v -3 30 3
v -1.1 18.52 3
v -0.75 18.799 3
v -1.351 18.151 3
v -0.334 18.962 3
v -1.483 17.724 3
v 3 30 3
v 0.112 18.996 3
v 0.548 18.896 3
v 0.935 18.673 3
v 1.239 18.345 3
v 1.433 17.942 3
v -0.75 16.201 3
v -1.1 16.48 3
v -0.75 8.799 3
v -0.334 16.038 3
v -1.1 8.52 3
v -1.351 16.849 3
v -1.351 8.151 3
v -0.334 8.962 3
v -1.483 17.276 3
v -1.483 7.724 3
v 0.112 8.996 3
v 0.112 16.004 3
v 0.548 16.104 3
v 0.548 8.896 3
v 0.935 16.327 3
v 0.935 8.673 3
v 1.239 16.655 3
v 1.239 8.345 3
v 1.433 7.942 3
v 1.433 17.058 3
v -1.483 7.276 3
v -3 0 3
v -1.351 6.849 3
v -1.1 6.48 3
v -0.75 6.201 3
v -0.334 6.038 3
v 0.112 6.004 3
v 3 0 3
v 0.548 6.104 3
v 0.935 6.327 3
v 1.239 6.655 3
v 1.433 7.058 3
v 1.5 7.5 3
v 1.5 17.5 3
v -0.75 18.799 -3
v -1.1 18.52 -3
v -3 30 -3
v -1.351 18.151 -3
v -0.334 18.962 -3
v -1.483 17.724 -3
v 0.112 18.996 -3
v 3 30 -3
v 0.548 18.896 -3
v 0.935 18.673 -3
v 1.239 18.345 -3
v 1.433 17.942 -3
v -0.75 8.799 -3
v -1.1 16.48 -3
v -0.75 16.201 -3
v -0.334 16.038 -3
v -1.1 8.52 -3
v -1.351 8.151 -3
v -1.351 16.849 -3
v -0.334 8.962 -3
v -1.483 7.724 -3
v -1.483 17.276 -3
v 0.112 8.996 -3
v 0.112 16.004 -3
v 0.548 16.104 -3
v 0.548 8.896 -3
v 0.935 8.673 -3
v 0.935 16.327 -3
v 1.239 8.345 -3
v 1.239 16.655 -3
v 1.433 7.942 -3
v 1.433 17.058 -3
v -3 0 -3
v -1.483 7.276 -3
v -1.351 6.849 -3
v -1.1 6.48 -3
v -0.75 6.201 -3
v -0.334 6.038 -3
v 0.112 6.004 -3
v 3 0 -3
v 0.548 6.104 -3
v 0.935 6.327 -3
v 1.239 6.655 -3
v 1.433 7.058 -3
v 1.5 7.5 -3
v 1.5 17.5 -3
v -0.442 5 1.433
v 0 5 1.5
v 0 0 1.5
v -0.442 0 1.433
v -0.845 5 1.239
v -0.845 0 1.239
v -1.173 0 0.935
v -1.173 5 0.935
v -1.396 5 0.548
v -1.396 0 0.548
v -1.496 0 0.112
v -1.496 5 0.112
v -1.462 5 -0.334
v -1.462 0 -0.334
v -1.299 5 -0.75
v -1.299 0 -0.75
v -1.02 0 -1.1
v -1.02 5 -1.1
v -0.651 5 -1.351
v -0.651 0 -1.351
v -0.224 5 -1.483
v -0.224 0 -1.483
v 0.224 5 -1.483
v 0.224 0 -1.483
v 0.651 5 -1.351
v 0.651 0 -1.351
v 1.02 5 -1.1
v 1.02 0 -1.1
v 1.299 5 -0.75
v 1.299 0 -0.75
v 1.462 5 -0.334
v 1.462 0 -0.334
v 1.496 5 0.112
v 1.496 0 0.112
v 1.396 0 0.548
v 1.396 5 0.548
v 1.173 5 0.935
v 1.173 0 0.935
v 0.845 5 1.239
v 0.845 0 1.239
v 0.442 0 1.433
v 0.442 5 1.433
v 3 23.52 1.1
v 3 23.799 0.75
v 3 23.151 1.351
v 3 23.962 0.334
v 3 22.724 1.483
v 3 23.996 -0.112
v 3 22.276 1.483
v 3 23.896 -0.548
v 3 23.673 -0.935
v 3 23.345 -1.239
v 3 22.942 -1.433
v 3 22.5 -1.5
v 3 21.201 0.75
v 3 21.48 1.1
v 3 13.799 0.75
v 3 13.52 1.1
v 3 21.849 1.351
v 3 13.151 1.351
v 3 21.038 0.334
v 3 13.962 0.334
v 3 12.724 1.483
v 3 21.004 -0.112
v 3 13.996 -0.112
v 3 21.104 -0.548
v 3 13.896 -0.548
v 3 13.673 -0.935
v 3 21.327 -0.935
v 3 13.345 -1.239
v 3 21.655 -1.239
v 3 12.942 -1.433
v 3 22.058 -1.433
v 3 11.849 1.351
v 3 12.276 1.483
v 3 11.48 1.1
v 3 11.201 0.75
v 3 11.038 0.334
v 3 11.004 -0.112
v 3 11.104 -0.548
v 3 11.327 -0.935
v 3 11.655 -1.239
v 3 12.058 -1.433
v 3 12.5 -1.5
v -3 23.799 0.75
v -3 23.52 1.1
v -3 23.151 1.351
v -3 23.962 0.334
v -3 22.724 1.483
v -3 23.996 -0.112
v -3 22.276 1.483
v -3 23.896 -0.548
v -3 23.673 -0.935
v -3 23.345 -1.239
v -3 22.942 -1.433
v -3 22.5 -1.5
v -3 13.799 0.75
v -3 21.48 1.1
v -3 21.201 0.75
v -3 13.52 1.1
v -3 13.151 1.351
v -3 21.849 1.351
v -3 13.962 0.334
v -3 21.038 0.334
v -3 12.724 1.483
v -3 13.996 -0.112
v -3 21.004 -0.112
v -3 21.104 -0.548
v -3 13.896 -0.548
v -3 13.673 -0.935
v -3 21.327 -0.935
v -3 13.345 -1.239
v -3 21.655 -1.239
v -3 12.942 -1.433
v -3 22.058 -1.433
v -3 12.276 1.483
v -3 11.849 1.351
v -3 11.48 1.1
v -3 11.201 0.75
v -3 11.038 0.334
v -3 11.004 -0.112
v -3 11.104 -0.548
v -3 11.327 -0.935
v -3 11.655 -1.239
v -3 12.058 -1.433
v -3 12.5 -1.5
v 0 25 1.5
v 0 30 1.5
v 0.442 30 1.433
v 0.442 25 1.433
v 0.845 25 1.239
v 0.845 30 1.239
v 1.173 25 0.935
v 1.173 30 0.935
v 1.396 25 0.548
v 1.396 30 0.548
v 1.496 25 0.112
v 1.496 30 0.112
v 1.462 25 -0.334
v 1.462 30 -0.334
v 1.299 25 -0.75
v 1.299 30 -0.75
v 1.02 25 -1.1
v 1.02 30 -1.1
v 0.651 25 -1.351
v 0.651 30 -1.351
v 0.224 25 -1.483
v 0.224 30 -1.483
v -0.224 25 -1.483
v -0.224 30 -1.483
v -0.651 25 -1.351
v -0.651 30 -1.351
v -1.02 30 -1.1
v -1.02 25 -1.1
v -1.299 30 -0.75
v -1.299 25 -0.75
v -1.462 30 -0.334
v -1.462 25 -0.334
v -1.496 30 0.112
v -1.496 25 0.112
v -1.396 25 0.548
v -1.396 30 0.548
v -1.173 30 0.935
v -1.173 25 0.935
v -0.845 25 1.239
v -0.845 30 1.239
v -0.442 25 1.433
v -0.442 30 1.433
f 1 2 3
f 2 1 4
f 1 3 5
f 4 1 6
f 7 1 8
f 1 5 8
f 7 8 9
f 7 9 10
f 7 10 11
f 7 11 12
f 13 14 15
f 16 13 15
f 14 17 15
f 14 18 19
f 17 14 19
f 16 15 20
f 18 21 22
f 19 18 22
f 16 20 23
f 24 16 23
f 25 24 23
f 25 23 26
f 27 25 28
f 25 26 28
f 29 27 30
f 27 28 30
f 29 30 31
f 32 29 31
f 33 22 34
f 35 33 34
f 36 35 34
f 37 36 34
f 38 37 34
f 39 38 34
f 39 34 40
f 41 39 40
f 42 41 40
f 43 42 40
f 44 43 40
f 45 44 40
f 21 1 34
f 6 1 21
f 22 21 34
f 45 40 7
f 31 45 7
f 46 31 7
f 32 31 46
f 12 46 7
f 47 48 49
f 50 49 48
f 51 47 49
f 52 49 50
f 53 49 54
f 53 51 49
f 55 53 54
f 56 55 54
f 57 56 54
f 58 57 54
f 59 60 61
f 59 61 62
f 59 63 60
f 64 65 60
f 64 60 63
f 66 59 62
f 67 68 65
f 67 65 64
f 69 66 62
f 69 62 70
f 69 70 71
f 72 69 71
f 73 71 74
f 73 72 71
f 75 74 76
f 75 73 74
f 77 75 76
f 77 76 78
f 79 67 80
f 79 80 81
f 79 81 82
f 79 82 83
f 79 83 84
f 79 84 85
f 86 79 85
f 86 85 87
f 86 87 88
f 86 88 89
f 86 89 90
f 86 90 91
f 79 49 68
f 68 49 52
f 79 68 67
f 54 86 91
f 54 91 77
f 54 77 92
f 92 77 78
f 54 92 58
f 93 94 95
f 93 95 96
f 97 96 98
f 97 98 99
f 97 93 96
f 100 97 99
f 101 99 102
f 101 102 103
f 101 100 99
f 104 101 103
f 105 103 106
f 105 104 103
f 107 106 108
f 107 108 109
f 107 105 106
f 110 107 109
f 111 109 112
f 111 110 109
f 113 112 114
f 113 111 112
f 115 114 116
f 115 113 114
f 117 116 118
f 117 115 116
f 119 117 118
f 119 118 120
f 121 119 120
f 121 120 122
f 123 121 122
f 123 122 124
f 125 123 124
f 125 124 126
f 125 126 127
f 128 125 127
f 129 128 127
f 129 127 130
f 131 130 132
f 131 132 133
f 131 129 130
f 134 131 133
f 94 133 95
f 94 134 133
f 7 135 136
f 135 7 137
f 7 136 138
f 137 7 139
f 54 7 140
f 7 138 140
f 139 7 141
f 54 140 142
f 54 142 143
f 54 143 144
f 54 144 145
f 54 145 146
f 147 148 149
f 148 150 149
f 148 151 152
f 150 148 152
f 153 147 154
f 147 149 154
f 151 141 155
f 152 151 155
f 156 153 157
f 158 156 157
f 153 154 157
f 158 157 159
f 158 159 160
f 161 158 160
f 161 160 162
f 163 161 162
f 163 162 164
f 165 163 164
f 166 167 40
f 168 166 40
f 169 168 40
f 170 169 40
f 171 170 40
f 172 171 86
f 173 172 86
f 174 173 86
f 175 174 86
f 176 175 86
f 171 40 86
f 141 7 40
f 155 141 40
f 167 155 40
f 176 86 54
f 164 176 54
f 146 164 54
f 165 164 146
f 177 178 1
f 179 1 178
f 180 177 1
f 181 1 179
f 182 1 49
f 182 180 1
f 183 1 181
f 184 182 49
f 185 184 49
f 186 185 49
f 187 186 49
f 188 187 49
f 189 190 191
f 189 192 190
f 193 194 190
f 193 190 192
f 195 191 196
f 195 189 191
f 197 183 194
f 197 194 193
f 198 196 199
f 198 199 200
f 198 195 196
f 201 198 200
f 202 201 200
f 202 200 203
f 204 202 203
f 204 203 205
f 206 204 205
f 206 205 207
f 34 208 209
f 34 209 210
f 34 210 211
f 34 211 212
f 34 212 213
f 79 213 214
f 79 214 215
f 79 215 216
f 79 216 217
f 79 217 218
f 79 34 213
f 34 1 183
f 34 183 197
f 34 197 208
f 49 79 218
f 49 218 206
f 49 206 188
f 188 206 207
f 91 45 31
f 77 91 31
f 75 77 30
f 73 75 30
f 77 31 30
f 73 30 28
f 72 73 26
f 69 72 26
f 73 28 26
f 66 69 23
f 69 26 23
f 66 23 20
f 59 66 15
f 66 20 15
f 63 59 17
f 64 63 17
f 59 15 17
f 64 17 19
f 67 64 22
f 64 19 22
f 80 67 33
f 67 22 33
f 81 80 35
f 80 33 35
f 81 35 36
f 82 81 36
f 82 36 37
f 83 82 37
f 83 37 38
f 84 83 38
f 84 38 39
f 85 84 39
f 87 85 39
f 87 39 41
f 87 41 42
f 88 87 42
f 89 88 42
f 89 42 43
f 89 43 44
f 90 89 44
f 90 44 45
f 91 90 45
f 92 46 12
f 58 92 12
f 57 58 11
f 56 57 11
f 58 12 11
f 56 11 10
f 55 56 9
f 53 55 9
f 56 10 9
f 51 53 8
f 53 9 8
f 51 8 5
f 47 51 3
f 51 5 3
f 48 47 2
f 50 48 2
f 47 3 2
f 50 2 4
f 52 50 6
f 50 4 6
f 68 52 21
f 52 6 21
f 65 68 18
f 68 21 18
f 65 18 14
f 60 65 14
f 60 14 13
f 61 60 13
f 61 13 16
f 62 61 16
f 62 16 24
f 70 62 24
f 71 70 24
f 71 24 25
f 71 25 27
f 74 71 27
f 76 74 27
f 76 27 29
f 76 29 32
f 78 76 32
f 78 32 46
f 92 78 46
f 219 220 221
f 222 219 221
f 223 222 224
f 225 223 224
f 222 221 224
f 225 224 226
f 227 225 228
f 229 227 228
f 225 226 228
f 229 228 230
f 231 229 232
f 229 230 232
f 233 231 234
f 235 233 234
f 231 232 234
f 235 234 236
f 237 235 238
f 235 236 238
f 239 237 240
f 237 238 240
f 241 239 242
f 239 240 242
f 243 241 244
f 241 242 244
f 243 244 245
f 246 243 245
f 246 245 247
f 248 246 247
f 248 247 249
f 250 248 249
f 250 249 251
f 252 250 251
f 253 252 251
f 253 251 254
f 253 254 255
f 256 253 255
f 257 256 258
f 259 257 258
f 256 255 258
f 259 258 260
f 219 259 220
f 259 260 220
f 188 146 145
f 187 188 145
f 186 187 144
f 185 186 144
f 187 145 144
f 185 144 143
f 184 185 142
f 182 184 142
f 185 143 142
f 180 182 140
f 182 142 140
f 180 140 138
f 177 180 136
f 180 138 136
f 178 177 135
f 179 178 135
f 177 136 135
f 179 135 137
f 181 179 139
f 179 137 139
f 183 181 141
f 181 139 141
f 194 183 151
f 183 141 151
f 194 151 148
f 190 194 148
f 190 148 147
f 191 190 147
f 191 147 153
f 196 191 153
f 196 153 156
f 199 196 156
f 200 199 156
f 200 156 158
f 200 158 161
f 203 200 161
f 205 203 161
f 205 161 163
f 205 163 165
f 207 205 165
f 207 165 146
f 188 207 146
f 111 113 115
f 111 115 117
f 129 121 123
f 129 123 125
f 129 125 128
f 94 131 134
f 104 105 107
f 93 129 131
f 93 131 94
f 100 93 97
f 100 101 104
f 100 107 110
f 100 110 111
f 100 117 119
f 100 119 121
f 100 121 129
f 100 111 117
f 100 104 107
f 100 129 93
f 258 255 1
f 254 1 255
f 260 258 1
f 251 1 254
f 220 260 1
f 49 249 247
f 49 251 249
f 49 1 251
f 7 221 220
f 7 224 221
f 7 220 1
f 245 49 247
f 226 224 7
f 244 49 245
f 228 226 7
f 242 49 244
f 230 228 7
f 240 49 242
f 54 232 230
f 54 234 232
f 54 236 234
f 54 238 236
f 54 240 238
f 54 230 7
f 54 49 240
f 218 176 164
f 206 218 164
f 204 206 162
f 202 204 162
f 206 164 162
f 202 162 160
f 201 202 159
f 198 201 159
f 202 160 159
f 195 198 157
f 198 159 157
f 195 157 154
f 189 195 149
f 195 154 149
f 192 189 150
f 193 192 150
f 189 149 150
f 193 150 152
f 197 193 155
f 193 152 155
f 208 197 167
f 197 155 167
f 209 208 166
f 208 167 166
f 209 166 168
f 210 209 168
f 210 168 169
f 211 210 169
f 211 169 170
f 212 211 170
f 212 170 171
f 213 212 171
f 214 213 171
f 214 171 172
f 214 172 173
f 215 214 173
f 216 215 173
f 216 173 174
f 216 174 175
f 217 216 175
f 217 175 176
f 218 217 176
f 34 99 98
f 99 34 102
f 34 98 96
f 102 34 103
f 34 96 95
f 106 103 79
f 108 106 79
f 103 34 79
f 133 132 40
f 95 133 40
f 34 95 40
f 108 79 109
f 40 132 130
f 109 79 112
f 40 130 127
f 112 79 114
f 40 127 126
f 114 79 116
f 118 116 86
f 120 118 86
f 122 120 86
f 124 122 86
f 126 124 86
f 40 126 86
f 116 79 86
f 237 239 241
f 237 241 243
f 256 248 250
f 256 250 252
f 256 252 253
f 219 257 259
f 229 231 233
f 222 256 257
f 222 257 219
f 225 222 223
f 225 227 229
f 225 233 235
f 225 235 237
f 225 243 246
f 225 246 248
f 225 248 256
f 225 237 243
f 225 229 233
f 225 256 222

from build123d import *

# Parameters (mm, degrees)
SKETCH_1_W          = 6
SKETCH_1_H          = 6
EXTRUDE_1_DEPTH     = 30
CUT_EXTRUDE_1_REACH = 32.741
SKETCH_2_R          = 1.5
CUT_EXTRUDE_2_REACH = 32.741
SKETCH_3_R          = 1.5
SKETCH_4_R          = 1.5
CUT_EXTRUDE_3_DEPTH = 5
CUT_EXTRUDE_START   = -5
SKETCH_5_R          = 1.5
CUT_EXTRUDE_4_DEPTH = 5


with BuildPart() as part:
    # 草图1 → 凸台-拉伸1 (new body)
    with BuildSketch(Plane(origin=(0, 0, 0), x_dir=(1, 0, 0), z_dir=(0, 1, 0))):
        Rectangle(SKETCH_1_W, SKETCH_1_H)
    extrude(amount=EXTRUDE_1_DEPTH)

    # 草图2 → 切除-拉伸1 (cut, up to next)
    with BuildSketch(Plane.XY.offset(3), mode=Mode.PRIVATE) as cut_extrude_1_sk1:
        with Locations((0, 17.5)):
            Circle(SKETCH_2_R)
    cut_extrude_1_tool1 = extrude(cut_extrude_1_sk1.sketch, amount=-CUT_EXTRUDE_1_REACH, mode=Mode.PRIVATE) & part.part
    # 草图2 → 切除-拉伸1 (cut, up to next)
    with BuildSketch(Plane.XY.offset(3), mode=Mode.PRIVATE) as cut_extrude_1_sk2:
        with Locations((0, 7.5)):
            Circle(SKETCH_2_R)
    cut_extrude_1_tool2 = extrude(cut_extrude_1_sk2.sketch, amount=-CUT_EXTRUDE_1_REACH, mode=Mode.PRIVATE) & part.part
    add(cut_extrude_1_tool1.solids().sort_by_distance((0, 17.5, 3))[0], mode=Mode.SUBTRACT)
    add(cut_extrude_1_tool2.solids().sort_by_distance((0, 7.5, 3))[0], mode=Mode.SUBTRACT)

    # 草图3 → 切除-拉伸2 (cut, up to next)
    with BuildSketch(Plane(origin=(3, 0, 0), x_dir=(0, 0, -1), z_dir=(1, 0, 0)), mode=Mode.PRIVATE) as cut_extrude_2_sk1:
        with Locations((0, 22.5)):
            Circle(SKETCH_3_R)
    cut_extrude_2_tool1 = extrude(cut_extrude_2_sk1.sketch, amount=-CUT_EXTRUDE_2_REACH, mode=Mode.PRIVATE) & part.part
    # 草图3 → 切除-拉伸2 (cut, up to next)
    with BuildSketch(Plane(origin=(3, 0, 0), x_dir=(0, 0, -1), z_dir=(1, 0, 0)), mode=Mode.PRIVATE) as cut_extrude_2_sk2:
        with Locations((0, 12.5)):
            Circle(SKETCH_3_R)
    cut_extrude_2_tool2 = extrude(cut_extrude_2_sk2.sketch, amount=-CUT_EXTRUDE_2_REACH, mode=Mode.PRIVATE) & part.part
    add(cut_extrude_2_tool1.solids().sort_by_distance((3, 22.5, 0))[0], mode=Mode.SUBTRACT)
    add(cut_extrude_2_tool2.solids().sort_by_distance((3, 12.5, 0))[0], mode=Mode.SUBTRACT)

    # 草图4 → 切除-拉伸3 (cut)
    with BuildSketch(Plane(origin=(0, 30, 0), x_dir=(1, 0, 0), z_dir=(0, 1, 0))):
        with Locations(Location((0, 0, 0), (0, 0, 270))):
            Circle(SKETCH_4_R)
    extrude(amount=-CUT_EXTRUDE_3_DEPTH, mode=Mode.SUBTRACT)

    # 草图5 → 切除-拉伸4 (cut)
    with BuildSketch(Plane.XZ.offset(CUT_EXTRUDE_START)):
        with Locations(Location((0, 0, 0), (0, 0, 90))):
            Circle(SKETCH_5_R)
    extrude(amount=CUT_EXTRUDE_4_DEPTH, mode=Mode.SUBTRACT)


solid = part.part
